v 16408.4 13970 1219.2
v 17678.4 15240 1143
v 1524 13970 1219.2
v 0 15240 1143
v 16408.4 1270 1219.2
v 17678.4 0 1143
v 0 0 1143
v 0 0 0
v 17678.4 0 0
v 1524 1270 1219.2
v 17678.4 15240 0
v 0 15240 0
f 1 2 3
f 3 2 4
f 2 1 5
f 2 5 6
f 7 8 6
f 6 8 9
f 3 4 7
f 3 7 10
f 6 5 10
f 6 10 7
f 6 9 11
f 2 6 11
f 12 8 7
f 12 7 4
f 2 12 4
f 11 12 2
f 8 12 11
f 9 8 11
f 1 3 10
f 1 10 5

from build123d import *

# Parameters (mm, degrees)
F0_W        = 17678.4
F0_H        = 15240
F1_DEPTH    = 1219.2
F3_DEPTH    = 15240.001
F4_T1_DEPTH = 22757.9615534728
F4_T3_DEPTH = 21843.5615534728


# Not quite as in the source:
# - a fillet or chamfer that OpenCascade refuses, or shapes differently, is made with other operations: its cross-section is extruded or revolved along the edge and cut away or added


with BuildPart() as f1:
    # F0 (on Top) → F1 (new body)
    with BuildSketch(Plane.XY):
        with Locations((8839.2, 7620)):
            Rectangle(F0_W, F0_H)
    extrude(amount=F1_DEPTH)

    # F2 (on face) → F3 (cut, through all)
    with BuildSketch(Plane.XZ):
        Polygon((0, 1219.2), (0, 1143), (1524, 1219.2), align=None)
    extrude(amount=-F3_DEPTH, mode=Mode.SUBTRACT)

    # F4: chamfer of 1270 x 76.2 on 3 edges, made by hand

    # F4_s2 → F4_t1 (cut)
    with BuildSketch(Plane.YZ.offset(-1777.7807767364)):
        Polygon((1270, 1219.2), (0, 1143), (0, 1219.2), align=None)
        Polygon((15240, 1143), (13970, 1219.2), (15240, 1219.2), align=None)
    extrude(amount=F4_T1_DEPTH, mode=Mode.SUBTRACT)

    # F4_s4 → F4_t3 (cut)
    with BuildSketch(Plane.XZ.offset(-18541.7807767364)):
        Polygon((16408.4, 1219.2), (17678.4, 1143), (17678.4, 1219.2), align=None)
    extrude(amount=F4_T3_DEPTH, mode=Mode.SUBTRACT)


solid = f1.part
